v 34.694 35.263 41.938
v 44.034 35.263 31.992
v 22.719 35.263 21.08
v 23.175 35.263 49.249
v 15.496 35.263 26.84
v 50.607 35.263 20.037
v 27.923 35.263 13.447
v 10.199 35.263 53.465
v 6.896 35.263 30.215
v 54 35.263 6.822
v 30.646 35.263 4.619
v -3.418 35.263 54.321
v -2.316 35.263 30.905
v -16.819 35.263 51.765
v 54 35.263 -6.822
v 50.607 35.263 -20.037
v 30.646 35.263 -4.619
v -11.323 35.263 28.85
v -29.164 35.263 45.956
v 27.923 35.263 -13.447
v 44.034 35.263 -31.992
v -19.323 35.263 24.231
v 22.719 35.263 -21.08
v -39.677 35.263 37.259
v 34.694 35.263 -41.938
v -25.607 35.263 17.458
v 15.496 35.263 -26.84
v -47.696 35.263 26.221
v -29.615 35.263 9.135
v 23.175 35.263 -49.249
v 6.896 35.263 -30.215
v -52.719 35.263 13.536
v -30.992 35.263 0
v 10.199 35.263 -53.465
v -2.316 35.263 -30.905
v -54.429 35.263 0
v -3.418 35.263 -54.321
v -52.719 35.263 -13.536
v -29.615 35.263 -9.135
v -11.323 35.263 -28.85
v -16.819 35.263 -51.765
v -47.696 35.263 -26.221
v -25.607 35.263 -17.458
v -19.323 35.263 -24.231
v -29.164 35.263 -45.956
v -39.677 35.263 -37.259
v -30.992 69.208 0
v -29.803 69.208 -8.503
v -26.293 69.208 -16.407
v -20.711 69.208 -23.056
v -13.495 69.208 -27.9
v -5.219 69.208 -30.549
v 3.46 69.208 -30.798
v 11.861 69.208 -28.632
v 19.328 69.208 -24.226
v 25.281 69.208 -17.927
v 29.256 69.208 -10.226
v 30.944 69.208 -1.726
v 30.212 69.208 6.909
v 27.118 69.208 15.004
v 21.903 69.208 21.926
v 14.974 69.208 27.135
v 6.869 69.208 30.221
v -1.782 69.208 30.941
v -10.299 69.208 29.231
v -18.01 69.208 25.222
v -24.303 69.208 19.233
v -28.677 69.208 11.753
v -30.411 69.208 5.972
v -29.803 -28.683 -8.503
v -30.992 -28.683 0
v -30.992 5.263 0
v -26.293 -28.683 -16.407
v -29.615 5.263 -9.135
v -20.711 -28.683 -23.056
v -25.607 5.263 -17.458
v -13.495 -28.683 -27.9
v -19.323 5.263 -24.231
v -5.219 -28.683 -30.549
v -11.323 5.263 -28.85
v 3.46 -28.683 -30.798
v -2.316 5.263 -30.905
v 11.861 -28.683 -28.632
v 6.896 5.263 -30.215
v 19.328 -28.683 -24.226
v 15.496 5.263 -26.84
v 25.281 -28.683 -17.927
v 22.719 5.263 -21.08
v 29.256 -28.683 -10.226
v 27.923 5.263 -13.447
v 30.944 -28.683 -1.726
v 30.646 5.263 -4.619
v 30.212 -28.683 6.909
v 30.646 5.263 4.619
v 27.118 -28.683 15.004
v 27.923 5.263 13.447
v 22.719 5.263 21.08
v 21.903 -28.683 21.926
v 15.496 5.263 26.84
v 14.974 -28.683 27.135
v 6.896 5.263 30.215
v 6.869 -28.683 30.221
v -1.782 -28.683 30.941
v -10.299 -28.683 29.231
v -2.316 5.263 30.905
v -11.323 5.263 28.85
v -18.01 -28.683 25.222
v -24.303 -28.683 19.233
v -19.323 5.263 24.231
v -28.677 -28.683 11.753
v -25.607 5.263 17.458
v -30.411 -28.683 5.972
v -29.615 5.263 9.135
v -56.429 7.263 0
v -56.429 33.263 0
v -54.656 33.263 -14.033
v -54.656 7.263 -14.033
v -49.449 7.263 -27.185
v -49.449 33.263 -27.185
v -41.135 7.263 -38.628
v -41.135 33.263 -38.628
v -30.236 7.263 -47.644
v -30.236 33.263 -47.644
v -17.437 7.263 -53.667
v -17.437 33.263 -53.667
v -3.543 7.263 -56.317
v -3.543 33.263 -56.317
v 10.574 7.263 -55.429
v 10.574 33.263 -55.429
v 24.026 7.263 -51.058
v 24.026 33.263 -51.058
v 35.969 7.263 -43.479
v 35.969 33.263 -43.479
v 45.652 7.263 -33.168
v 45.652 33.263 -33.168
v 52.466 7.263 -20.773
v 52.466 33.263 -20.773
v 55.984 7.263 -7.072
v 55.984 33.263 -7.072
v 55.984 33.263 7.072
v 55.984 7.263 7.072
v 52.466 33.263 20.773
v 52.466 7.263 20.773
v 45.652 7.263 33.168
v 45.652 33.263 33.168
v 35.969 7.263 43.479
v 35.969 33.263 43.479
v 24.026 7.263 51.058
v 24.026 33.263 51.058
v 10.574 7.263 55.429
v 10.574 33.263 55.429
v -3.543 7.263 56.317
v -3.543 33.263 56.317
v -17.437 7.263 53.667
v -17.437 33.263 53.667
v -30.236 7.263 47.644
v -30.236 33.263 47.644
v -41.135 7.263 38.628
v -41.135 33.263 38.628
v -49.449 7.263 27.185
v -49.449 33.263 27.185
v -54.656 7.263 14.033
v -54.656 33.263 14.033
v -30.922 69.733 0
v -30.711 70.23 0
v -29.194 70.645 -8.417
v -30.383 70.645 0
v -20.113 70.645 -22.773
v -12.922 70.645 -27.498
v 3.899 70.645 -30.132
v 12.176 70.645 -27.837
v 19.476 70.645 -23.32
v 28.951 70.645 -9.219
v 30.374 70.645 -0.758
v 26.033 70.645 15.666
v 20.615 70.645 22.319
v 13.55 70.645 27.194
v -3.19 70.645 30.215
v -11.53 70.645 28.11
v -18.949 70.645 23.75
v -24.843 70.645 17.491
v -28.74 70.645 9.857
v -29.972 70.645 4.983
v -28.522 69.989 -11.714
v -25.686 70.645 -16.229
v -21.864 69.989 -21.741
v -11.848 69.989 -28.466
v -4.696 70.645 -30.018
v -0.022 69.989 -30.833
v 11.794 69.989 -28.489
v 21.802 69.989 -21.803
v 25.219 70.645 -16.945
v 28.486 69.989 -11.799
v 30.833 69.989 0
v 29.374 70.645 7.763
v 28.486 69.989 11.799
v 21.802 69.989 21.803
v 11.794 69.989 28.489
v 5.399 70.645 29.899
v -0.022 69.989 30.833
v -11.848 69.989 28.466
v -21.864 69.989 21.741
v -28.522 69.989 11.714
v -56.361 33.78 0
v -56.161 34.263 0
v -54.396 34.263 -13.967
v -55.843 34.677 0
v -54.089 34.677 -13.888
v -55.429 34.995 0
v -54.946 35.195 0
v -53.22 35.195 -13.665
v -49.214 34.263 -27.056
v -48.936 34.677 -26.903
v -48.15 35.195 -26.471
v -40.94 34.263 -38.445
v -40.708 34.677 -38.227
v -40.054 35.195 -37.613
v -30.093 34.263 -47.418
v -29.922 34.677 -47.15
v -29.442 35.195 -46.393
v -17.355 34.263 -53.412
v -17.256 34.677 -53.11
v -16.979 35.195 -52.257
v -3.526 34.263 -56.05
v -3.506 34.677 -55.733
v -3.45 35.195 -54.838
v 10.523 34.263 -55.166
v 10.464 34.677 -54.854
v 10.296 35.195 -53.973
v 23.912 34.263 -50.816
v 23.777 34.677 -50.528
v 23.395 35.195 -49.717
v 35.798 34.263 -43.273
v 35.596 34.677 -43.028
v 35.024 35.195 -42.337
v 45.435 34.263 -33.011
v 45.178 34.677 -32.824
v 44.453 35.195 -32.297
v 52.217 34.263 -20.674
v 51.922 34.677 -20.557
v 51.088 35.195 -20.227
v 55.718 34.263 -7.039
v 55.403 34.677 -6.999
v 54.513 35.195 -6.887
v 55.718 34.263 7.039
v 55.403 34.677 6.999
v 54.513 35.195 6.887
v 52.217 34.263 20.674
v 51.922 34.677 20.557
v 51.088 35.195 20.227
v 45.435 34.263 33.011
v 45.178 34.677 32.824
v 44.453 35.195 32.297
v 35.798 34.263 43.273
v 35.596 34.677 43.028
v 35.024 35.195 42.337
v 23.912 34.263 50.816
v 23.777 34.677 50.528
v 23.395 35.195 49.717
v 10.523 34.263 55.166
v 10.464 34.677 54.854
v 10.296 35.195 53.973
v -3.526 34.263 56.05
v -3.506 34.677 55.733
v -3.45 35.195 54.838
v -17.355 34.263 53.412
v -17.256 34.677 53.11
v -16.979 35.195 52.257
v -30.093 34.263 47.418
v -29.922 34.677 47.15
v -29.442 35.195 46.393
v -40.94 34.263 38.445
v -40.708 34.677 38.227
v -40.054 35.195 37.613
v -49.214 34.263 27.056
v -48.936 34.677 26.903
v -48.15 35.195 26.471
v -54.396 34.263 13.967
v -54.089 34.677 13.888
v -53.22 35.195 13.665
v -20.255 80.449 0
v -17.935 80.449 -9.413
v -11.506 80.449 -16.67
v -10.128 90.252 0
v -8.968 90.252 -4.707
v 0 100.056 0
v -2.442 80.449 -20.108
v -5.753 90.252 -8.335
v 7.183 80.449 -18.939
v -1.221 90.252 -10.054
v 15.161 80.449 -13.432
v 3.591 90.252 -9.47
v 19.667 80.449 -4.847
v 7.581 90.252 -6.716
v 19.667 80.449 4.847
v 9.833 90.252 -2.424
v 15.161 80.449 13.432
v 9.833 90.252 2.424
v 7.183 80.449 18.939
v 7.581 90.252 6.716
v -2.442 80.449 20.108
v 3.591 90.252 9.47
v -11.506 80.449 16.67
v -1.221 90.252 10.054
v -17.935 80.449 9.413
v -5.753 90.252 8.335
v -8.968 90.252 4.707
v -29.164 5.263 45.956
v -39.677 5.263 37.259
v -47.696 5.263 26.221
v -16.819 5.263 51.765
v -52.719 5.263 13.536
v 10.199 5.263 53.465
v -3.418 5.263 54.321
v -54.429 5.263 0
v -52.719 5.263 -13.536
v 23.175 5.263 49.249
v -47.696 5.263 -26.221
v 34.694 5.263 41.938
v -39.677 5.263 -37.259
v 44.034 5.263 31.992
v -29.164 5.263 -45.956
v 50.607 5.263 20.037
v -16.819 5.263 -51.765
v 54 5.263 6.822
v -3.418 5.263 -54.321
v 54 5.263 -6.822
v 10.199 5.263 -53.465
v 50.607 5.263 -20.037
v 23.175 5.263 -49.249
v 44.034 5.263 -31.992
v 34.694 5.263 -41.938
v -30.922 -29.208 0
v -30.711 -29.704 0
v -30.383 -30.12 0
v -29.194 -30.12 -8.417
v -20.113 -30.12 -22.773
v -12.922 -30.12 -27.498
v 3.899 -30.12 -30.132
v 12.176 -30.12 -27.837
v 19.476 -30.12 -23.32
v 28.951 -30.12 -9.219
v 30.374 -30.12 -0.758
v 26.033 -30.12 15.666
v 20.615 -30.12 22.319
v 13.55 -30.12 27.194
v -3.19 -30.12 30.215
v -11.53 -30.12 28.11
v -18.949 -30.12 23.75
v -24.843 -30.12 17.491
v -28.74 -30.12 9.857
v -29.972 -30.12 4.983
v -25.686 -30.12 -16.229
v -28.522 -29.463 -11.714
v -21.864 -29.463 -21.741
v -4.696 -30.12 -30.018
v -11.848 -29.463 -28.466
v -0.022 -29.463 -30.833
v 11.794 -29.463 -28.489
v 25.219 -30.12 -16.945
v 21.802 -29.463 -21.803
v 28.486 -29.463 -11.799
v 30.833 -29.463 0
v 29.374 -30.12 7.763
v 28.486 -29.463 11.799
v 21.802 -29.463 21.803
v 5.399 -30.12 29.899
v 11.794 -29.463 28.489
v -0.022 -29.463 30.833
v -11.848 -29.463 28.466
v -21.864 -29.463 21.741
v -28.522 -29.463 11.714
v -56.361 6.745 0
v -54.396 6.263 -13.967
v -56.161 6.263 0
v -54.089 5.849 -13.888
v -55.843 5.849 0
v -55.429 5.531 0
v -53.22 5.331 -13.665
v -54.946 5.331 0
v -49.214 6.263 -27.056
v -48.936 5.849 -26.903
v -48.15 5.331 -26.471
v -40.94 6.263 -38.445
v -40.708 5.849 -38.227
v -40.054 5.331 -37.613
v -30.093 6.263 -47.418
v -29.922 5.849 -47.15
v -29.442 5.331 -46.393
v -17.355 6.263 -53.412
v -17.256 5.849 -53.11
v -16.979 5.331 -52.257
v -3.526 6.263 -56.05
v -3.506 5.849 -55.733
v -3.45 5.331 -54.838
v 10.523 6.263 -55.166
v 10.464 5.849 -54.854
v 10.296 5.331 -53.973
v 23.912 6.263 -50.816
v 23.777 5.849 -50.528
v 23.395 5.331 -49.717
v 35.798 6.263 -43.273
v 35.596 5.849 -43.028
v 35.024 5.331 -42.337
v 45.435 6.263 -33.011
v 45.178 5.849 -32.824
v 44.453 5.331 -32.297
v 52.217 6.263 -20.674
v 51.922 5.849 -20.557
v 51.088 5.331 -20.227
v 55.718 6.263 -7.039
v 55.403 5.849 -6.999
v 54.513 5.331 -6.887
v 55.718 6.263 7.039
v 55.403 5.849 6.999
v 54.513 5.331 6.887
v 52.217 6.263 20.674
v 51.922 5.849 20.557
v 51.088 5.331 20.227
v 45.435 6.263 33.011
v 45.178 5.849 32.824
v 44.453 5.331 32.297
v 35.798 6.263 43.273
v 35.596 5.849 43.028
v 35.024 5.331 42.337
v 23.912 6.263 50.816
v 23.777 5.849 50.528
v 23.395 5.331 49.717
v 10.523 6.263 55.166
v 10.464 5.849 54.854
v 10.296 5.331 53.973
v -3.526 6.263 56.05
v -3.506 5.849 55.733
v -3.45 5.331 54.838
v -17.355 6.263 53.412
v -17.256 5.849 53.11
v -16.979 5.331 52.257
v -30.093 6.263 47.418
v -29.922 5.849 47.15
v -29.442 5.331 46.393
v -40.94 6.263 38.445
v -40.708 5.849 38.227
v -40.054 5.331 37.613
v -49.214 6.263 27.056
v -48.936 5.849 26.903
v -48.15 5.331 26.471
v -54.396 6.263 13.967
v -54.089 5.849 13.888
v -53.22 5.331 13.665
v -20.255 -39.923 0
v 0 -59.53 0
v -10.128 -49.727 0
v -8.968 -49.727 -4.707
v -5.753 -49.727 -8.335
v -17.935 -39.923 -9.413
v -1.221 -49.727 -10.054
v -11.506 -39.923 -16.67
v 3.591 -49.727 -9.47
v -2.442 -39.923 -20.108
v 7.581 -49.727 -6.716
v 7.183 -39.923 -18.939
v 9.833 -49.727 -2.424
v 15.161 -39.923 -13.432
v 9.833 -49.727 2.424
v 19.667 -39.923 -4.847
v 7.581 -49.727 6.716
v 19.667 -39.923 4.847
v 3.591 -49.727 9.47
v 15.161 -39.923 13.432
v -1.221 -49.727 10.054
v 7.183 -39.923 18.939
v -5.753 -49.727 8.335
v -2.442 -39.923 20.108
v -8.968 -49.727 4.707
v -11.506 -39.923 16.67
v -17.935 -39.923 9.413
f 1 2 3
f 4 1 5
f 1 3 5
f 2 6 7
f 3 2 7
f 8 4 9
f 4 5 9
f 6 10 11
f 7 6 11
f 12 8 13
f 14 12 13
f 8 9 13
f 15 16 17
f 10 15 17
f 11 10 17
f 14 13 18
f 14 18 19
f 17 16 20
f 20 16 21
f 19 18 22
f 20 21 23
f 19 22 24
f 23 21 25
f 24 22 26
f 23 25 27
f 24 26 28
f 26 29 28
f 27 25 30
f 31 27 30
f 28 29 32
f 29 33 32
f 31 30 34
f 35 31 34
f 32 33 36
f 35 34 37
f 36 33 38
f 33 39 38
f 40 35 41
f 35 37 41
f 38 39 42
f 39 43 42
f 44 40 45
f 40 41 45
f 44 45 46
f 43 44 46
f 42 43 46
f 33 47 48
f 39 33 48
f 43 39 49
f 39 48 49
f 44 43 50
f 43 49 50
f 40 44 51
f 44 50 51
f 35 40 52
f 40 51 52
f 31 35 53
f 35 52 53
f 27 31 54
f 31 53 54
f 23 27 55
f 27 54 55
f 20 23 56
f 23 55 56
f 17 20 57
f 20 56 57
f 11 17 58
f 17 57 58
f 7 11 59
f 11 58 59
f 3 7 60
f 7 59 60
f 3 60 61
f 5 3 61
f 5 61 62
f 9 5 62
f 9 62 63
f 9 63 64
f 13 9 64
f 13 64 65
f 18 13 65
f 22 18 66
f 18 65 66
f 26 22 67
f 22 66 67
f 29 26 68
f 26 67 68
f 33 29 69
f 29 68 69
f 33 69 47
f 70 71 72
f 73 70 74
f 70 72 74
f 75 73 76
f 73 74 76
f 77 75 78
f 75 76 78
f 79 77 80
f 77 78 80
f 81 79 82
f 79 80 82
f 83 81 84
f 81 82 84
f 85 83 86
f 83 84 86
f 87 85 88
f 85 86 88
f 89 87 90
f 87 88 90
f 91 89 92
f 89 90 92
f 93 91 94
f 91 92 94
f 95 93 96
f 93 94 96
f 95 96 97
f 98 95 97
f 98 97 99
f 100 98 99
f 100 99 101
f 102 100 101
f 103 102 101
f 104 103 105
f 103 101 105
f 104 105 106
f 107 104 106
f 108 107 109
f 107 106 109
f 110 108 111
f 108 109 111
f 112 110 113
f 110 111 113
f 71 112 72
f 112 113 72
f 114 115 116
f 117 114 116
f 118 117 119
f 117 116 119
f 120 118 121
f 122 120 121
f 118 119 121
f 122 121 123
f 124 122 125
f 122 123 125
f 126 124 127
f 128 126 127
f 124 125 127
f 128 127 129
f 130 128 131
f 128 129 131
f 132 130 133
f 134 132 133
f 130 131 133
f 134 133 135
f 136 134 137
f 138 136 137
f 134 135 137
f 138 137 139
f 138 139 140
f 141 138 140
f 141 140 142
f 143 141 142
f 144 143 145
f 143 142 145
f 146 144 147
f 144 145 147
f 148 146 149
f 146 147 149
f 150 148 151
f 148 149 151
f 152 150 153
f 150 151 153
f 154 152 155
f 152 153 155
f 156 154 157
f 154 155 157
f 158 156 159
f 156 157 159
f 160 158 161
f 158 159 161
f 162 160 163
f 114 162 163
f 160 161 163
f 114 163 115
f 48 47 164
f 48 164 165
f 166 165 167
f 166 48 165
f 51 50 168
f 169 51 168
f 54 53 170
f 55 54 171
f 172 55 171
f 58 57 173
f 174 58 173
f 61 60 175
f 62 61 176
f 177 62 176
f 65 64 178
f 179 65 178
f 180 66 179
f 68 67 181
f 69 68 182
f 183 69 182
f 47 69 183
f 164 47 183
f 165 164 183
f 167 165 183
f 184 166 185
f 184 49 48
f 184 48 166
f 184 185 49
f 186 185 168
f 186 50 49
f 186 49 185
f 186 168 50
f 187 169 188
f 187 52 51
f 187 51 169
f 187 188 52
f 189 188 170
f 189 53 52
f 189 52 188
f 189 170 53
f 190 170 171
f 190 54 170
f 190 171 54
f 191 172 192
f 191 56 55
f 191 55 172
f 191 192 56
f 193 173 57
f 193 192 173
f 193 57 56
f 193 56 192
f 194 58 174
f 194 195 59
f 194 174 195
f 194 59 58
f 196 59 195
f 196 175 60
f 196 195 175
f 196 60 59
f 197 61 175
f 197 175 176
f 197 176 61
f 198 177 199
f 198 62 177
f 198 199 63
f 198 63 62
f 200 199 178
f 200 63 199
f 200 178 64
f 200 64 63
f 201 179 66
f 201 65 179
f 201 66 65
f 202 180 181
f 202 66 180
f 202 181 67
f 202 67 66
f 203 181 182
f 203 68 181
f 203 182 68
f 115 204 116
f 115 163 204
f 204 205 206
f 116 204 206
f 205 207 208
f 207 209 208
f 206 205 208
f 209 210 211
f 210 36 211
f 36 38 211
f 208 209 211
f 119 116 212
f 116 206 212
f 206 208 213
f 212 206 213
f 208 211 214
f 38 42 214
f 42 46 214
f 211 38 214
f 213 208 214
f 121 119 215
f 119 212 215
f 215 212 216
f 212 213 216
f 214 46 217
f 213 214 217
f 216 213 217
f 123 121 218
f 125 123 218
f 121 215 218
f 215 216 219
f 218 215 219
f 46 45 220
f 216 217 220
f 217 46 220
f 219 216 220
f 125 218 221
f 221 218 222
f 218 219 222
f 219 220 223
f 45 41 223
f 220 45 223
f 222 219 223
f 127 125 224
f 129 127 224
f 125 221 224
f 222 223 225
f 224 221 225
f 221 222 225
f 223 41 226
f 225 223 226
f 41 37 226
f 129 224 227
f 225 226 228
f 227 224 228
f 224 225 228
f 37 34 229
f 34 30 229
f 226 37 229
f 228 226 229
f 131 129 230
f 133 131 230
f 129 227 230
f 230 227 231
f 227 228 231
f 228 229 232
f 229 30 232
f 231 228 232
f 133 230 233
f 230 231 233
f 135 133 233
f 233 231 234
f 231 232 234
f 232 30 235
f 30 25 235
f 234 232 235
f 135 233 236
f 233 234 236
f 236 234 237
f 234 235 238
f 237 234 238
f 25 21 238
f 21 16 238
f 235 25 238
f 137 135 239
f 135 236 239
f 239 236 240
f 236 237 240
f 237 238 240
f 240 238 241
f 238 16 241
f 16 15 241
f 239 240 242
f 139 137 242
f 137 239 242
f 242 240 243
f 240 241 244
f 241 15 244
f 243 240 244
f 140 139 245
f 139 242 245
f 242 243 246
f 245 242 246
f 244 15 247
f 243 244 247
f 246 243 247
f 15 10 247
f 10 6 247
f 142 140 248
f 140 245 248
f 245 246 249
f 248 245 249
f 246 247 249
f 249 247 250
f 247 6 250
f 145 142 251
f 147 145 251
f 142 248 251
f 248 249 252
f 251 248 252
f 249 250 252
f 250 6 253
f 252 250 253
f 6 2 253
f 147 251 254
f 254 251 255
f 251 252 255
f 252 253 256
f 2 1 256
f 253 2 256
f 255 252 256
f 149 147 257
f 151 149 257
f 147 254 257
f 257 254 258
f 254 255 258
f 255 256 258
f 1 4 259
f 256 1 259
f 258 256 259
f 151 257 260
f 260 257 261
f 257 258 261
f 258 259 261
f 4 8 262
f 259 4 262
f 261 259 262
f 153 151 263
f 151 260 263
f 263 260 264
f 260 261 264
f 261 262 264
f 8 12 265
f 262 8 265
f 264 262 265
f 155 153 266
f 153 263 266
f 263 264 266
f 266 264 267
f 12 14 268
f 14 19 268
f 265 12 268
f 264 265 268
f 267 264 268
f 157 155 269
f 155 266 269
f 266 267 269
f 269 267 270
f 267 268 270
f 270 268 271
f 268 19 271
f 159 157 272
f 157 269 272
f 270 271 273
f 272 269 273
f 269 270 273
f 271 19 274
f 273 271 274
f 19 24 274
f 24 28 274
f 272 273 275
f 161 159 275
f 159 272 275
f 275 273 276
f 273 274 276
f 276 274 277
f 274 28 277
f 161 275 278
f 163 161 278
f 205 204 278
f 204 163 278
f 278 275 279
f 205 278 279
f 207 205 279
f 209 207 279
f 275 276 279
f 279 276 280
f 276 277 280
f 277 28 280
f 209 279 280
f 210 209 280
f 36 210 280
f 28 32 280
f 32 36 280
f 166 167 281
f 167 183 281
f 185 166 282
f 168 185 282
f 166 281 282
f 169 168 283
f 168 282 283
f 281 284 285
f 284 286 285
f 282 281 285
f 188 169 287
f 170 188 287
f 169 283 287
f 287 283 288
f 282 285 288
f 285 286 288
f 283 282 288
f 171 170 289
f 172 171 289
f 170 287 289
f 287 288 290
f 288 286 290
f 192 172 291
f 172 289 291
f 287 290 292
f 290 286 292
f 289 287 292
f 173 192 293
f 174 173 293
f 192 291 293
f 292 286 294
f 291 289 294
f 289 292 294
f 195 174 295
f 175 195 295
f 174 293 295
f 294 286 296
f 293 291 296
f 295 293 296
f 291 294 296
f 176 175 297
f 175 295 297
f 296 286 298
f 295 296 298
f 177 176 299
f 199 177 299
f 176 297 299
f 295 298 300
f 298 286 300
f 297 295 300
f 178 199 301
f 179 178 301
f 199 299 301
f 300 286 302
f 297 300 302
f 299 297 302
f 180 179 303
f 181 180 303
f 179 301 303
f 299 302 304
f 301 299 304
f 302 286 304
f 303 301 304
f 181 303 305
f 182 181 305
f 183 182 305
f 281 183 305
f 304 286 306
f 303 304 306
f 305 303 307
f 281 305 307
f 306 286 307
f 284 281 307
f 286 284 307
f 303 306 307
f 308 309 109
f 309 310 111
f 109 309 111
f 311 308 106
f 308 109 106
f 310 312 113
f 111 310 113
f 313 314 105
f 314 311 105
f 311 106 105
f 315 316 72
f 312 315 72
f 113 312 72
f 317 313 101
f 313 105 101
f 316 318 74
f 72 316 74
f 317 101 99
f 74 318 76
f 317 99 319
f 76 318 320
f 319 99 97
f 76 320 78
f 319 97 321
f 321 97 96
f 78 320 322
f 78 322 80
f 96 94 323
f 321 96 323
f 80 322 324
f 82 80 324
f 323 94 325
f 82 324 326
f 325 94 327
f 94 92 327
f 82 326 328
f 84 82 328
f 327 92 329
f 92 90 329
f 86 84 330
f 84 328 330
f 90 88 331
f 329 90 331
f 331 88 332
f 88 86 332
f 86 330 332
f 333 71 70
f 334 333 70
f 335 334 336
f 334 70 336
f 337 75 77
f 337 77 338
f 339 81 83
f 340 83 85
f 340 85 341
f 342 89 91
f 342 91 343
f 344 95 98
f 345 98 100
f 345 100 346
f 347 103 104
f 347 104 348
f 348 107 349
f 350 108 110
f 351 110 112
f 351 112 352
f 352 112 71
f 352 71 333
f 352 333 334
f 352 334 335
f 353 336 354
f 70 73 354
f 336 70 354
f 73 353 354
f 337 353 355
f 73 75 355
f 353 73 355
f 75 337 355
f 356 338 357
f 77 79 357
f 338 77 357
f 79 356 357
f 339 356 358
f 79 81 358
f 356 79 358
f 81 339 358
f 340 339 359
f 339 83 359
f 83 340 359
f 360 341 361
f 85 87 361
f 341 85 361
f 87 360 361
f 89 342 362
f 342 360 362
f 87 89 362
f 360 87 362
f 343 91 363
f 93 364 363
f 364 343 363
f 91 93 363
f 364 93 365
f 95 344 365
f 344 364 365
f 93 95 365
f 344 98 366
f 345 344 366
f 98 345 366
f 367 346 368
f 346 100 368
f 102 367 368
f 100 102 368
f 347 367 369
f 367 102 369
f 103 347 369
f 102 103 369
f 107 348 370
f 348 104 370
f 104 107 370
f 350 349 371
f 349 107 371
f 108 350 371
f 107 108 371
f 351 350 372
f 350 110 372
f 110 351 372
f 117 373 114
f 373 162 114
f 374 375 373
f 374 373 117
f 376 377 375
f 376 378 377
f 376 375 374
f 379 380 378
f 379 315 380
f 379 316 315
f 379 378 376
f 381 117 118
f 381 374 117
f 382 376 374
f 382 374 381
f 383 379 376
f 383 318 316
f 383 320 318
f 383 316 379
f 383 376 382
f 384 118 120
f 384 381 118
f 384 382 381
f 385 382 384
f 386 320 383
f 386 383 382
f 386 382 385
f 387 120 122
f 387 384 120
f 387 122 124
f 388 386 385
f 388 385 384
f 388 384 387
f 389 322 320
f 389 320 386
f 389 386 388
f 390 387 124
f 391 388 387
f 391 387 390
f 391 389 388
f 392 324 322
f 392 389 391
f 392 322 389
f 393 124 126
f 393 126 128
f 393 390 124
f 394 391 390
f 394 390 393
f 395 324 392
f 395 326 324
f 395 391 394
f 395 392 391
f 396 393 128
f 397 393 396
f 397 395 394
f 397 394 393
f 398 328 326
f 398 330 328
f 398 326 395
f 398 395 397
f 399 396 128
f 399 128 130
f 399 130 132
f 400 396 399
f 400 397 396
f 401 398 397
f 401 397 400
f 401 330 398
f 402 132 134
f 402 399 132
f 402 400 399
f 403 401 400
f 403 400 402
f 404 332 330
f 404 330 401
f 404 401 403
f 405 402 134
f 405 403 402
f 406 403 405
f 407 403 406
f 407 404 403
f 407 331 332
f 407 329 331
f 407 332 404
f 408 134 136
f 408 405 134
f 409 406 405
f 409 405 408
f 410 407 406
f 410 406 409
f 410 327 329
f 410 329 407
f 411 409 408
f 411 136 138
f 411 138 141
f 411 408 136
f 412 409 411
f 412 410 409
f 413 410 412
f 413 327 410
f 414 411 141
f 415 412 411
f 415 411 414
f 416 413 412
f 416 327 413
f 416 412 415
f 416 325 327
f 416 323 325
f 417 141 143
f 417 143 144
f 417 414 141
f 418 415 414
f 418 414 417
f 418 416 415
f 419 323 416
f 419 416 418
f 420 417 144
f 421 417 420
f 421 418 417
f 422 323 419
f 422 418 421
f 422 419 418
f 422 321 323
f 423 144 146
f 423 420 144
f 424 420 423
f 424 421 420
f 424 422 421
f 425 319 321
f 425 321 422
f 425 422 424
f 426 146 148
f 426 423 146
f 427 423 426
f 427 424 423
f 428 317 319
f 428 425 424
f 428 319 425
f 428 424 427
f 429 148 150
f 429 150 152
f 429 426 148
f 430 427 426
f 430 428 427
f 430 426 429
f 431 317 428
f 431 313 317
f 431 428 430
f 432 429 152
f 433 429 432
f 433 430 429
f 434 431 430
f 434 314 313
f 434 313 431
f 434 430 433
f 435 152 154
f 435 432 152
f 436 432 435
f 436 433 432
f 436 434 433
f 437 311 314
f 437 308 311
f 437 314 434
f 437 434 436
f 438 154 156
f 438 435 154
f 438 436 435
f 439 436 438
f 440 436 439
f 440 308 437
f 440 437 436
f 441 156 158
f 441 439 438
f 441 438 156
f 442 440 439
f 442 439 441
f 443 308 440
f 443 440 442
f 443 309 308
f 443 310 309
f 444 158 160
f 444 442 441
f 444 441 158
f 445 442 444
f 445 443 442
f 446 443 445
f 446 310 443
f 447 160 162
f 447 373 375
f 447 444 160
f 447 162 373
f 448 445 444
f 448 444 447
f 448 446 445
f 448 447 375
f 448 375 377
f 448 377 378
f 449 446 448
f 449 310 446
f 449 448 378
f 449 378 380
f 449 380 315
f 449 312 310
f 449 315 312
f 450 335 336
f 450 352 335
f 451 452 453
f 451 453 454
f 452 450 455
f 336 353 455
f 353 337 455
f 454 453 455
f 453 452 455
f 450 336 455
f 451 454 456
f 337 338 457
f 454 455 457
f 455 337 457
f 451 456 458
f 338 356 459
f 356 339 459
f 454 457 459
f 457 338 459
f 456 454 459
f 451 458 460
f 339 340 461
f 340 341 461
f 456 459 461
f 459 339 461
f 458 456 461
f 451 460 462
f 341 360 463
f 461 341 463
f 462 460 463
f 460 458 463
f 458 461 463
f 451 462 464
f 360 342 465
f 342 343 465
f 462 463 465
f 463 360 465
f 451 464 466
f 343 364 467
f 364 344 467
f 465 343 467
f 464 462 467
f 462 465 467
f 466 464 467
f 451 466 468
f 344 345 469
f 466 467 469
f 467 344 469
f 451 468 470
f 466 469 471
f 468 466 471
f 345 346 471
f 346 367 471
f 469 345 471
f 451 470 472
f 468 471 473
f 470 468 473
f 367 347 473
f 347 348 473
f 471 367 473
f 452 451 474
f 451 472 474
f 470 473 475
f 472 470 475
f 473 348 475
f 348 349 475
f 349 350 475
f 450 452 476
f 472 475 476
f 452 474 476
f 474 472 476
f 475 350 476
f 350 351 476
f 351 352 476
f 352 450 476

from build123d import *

# Parameters (mm, degrees)
FILLET_1_R = 2
FILLET_2_R = 2
FILLET_3_R = 2
FILLET_4_R = 2


with BuildPart() as part:
    # 草图1 → 旋转1 (revolve)
    with BuildSketch(Plane.XY):
        Polygon((0, 70.055695547), (0, -29.530111316), (-30.991998015, -29.530111316), (-30.991998015, 5.262792116), (-56.428826574, 5.262792116), (-56.428826574, 35.262792116), (-30.991998015, 35.262792116), (-30.991998015, 70.055695547), align=None)
        Polygon((0, 100.055695547), (0, 70.055695547), (-30.991998015, 70.055695547), align=None)
        Polygon((0, -29.530111316), (0, -59.530111316), (-30.991998015, -29.530111316), align=None)
    revolve(axis=Axis((0, 70.055695547, 0), (0, -1, 0)))

    # 圆角1
    fillet_1_edges = [part.edges().sort_by_distance(p)[0] for p in [
        (56.428826574, 35.262792116, 0),
    ]]
    fillet(fillet_1_edges, radius=FILLET_1_R)

    # 圆角2
    fillet_2_edges = [part.edges().sort_by_distance(p)[0] for p in [
        (56.428826574, 5.262792116, 0),
    ]]
    fillet(fillet_2_edges, radius=FILLET_2_R)

    # 圆角3
    fillet_3_edges = [part.edges().sort_by_distance(p)[0] for p in [
        (30.991998015, 70.055695547, 0),
    ]]
    fillet(fillet_3_edges, radius=FILLET_3_R)

    # 圆角4
    fillet_4_edges = [part.edges().sort_by_distance(p)[0] for p in [
        (30.991998015, -29.530111316, 0),
    ]]
    fillet(fillet_4_edges, radius=FILLET_4_R)


solid = part.part
